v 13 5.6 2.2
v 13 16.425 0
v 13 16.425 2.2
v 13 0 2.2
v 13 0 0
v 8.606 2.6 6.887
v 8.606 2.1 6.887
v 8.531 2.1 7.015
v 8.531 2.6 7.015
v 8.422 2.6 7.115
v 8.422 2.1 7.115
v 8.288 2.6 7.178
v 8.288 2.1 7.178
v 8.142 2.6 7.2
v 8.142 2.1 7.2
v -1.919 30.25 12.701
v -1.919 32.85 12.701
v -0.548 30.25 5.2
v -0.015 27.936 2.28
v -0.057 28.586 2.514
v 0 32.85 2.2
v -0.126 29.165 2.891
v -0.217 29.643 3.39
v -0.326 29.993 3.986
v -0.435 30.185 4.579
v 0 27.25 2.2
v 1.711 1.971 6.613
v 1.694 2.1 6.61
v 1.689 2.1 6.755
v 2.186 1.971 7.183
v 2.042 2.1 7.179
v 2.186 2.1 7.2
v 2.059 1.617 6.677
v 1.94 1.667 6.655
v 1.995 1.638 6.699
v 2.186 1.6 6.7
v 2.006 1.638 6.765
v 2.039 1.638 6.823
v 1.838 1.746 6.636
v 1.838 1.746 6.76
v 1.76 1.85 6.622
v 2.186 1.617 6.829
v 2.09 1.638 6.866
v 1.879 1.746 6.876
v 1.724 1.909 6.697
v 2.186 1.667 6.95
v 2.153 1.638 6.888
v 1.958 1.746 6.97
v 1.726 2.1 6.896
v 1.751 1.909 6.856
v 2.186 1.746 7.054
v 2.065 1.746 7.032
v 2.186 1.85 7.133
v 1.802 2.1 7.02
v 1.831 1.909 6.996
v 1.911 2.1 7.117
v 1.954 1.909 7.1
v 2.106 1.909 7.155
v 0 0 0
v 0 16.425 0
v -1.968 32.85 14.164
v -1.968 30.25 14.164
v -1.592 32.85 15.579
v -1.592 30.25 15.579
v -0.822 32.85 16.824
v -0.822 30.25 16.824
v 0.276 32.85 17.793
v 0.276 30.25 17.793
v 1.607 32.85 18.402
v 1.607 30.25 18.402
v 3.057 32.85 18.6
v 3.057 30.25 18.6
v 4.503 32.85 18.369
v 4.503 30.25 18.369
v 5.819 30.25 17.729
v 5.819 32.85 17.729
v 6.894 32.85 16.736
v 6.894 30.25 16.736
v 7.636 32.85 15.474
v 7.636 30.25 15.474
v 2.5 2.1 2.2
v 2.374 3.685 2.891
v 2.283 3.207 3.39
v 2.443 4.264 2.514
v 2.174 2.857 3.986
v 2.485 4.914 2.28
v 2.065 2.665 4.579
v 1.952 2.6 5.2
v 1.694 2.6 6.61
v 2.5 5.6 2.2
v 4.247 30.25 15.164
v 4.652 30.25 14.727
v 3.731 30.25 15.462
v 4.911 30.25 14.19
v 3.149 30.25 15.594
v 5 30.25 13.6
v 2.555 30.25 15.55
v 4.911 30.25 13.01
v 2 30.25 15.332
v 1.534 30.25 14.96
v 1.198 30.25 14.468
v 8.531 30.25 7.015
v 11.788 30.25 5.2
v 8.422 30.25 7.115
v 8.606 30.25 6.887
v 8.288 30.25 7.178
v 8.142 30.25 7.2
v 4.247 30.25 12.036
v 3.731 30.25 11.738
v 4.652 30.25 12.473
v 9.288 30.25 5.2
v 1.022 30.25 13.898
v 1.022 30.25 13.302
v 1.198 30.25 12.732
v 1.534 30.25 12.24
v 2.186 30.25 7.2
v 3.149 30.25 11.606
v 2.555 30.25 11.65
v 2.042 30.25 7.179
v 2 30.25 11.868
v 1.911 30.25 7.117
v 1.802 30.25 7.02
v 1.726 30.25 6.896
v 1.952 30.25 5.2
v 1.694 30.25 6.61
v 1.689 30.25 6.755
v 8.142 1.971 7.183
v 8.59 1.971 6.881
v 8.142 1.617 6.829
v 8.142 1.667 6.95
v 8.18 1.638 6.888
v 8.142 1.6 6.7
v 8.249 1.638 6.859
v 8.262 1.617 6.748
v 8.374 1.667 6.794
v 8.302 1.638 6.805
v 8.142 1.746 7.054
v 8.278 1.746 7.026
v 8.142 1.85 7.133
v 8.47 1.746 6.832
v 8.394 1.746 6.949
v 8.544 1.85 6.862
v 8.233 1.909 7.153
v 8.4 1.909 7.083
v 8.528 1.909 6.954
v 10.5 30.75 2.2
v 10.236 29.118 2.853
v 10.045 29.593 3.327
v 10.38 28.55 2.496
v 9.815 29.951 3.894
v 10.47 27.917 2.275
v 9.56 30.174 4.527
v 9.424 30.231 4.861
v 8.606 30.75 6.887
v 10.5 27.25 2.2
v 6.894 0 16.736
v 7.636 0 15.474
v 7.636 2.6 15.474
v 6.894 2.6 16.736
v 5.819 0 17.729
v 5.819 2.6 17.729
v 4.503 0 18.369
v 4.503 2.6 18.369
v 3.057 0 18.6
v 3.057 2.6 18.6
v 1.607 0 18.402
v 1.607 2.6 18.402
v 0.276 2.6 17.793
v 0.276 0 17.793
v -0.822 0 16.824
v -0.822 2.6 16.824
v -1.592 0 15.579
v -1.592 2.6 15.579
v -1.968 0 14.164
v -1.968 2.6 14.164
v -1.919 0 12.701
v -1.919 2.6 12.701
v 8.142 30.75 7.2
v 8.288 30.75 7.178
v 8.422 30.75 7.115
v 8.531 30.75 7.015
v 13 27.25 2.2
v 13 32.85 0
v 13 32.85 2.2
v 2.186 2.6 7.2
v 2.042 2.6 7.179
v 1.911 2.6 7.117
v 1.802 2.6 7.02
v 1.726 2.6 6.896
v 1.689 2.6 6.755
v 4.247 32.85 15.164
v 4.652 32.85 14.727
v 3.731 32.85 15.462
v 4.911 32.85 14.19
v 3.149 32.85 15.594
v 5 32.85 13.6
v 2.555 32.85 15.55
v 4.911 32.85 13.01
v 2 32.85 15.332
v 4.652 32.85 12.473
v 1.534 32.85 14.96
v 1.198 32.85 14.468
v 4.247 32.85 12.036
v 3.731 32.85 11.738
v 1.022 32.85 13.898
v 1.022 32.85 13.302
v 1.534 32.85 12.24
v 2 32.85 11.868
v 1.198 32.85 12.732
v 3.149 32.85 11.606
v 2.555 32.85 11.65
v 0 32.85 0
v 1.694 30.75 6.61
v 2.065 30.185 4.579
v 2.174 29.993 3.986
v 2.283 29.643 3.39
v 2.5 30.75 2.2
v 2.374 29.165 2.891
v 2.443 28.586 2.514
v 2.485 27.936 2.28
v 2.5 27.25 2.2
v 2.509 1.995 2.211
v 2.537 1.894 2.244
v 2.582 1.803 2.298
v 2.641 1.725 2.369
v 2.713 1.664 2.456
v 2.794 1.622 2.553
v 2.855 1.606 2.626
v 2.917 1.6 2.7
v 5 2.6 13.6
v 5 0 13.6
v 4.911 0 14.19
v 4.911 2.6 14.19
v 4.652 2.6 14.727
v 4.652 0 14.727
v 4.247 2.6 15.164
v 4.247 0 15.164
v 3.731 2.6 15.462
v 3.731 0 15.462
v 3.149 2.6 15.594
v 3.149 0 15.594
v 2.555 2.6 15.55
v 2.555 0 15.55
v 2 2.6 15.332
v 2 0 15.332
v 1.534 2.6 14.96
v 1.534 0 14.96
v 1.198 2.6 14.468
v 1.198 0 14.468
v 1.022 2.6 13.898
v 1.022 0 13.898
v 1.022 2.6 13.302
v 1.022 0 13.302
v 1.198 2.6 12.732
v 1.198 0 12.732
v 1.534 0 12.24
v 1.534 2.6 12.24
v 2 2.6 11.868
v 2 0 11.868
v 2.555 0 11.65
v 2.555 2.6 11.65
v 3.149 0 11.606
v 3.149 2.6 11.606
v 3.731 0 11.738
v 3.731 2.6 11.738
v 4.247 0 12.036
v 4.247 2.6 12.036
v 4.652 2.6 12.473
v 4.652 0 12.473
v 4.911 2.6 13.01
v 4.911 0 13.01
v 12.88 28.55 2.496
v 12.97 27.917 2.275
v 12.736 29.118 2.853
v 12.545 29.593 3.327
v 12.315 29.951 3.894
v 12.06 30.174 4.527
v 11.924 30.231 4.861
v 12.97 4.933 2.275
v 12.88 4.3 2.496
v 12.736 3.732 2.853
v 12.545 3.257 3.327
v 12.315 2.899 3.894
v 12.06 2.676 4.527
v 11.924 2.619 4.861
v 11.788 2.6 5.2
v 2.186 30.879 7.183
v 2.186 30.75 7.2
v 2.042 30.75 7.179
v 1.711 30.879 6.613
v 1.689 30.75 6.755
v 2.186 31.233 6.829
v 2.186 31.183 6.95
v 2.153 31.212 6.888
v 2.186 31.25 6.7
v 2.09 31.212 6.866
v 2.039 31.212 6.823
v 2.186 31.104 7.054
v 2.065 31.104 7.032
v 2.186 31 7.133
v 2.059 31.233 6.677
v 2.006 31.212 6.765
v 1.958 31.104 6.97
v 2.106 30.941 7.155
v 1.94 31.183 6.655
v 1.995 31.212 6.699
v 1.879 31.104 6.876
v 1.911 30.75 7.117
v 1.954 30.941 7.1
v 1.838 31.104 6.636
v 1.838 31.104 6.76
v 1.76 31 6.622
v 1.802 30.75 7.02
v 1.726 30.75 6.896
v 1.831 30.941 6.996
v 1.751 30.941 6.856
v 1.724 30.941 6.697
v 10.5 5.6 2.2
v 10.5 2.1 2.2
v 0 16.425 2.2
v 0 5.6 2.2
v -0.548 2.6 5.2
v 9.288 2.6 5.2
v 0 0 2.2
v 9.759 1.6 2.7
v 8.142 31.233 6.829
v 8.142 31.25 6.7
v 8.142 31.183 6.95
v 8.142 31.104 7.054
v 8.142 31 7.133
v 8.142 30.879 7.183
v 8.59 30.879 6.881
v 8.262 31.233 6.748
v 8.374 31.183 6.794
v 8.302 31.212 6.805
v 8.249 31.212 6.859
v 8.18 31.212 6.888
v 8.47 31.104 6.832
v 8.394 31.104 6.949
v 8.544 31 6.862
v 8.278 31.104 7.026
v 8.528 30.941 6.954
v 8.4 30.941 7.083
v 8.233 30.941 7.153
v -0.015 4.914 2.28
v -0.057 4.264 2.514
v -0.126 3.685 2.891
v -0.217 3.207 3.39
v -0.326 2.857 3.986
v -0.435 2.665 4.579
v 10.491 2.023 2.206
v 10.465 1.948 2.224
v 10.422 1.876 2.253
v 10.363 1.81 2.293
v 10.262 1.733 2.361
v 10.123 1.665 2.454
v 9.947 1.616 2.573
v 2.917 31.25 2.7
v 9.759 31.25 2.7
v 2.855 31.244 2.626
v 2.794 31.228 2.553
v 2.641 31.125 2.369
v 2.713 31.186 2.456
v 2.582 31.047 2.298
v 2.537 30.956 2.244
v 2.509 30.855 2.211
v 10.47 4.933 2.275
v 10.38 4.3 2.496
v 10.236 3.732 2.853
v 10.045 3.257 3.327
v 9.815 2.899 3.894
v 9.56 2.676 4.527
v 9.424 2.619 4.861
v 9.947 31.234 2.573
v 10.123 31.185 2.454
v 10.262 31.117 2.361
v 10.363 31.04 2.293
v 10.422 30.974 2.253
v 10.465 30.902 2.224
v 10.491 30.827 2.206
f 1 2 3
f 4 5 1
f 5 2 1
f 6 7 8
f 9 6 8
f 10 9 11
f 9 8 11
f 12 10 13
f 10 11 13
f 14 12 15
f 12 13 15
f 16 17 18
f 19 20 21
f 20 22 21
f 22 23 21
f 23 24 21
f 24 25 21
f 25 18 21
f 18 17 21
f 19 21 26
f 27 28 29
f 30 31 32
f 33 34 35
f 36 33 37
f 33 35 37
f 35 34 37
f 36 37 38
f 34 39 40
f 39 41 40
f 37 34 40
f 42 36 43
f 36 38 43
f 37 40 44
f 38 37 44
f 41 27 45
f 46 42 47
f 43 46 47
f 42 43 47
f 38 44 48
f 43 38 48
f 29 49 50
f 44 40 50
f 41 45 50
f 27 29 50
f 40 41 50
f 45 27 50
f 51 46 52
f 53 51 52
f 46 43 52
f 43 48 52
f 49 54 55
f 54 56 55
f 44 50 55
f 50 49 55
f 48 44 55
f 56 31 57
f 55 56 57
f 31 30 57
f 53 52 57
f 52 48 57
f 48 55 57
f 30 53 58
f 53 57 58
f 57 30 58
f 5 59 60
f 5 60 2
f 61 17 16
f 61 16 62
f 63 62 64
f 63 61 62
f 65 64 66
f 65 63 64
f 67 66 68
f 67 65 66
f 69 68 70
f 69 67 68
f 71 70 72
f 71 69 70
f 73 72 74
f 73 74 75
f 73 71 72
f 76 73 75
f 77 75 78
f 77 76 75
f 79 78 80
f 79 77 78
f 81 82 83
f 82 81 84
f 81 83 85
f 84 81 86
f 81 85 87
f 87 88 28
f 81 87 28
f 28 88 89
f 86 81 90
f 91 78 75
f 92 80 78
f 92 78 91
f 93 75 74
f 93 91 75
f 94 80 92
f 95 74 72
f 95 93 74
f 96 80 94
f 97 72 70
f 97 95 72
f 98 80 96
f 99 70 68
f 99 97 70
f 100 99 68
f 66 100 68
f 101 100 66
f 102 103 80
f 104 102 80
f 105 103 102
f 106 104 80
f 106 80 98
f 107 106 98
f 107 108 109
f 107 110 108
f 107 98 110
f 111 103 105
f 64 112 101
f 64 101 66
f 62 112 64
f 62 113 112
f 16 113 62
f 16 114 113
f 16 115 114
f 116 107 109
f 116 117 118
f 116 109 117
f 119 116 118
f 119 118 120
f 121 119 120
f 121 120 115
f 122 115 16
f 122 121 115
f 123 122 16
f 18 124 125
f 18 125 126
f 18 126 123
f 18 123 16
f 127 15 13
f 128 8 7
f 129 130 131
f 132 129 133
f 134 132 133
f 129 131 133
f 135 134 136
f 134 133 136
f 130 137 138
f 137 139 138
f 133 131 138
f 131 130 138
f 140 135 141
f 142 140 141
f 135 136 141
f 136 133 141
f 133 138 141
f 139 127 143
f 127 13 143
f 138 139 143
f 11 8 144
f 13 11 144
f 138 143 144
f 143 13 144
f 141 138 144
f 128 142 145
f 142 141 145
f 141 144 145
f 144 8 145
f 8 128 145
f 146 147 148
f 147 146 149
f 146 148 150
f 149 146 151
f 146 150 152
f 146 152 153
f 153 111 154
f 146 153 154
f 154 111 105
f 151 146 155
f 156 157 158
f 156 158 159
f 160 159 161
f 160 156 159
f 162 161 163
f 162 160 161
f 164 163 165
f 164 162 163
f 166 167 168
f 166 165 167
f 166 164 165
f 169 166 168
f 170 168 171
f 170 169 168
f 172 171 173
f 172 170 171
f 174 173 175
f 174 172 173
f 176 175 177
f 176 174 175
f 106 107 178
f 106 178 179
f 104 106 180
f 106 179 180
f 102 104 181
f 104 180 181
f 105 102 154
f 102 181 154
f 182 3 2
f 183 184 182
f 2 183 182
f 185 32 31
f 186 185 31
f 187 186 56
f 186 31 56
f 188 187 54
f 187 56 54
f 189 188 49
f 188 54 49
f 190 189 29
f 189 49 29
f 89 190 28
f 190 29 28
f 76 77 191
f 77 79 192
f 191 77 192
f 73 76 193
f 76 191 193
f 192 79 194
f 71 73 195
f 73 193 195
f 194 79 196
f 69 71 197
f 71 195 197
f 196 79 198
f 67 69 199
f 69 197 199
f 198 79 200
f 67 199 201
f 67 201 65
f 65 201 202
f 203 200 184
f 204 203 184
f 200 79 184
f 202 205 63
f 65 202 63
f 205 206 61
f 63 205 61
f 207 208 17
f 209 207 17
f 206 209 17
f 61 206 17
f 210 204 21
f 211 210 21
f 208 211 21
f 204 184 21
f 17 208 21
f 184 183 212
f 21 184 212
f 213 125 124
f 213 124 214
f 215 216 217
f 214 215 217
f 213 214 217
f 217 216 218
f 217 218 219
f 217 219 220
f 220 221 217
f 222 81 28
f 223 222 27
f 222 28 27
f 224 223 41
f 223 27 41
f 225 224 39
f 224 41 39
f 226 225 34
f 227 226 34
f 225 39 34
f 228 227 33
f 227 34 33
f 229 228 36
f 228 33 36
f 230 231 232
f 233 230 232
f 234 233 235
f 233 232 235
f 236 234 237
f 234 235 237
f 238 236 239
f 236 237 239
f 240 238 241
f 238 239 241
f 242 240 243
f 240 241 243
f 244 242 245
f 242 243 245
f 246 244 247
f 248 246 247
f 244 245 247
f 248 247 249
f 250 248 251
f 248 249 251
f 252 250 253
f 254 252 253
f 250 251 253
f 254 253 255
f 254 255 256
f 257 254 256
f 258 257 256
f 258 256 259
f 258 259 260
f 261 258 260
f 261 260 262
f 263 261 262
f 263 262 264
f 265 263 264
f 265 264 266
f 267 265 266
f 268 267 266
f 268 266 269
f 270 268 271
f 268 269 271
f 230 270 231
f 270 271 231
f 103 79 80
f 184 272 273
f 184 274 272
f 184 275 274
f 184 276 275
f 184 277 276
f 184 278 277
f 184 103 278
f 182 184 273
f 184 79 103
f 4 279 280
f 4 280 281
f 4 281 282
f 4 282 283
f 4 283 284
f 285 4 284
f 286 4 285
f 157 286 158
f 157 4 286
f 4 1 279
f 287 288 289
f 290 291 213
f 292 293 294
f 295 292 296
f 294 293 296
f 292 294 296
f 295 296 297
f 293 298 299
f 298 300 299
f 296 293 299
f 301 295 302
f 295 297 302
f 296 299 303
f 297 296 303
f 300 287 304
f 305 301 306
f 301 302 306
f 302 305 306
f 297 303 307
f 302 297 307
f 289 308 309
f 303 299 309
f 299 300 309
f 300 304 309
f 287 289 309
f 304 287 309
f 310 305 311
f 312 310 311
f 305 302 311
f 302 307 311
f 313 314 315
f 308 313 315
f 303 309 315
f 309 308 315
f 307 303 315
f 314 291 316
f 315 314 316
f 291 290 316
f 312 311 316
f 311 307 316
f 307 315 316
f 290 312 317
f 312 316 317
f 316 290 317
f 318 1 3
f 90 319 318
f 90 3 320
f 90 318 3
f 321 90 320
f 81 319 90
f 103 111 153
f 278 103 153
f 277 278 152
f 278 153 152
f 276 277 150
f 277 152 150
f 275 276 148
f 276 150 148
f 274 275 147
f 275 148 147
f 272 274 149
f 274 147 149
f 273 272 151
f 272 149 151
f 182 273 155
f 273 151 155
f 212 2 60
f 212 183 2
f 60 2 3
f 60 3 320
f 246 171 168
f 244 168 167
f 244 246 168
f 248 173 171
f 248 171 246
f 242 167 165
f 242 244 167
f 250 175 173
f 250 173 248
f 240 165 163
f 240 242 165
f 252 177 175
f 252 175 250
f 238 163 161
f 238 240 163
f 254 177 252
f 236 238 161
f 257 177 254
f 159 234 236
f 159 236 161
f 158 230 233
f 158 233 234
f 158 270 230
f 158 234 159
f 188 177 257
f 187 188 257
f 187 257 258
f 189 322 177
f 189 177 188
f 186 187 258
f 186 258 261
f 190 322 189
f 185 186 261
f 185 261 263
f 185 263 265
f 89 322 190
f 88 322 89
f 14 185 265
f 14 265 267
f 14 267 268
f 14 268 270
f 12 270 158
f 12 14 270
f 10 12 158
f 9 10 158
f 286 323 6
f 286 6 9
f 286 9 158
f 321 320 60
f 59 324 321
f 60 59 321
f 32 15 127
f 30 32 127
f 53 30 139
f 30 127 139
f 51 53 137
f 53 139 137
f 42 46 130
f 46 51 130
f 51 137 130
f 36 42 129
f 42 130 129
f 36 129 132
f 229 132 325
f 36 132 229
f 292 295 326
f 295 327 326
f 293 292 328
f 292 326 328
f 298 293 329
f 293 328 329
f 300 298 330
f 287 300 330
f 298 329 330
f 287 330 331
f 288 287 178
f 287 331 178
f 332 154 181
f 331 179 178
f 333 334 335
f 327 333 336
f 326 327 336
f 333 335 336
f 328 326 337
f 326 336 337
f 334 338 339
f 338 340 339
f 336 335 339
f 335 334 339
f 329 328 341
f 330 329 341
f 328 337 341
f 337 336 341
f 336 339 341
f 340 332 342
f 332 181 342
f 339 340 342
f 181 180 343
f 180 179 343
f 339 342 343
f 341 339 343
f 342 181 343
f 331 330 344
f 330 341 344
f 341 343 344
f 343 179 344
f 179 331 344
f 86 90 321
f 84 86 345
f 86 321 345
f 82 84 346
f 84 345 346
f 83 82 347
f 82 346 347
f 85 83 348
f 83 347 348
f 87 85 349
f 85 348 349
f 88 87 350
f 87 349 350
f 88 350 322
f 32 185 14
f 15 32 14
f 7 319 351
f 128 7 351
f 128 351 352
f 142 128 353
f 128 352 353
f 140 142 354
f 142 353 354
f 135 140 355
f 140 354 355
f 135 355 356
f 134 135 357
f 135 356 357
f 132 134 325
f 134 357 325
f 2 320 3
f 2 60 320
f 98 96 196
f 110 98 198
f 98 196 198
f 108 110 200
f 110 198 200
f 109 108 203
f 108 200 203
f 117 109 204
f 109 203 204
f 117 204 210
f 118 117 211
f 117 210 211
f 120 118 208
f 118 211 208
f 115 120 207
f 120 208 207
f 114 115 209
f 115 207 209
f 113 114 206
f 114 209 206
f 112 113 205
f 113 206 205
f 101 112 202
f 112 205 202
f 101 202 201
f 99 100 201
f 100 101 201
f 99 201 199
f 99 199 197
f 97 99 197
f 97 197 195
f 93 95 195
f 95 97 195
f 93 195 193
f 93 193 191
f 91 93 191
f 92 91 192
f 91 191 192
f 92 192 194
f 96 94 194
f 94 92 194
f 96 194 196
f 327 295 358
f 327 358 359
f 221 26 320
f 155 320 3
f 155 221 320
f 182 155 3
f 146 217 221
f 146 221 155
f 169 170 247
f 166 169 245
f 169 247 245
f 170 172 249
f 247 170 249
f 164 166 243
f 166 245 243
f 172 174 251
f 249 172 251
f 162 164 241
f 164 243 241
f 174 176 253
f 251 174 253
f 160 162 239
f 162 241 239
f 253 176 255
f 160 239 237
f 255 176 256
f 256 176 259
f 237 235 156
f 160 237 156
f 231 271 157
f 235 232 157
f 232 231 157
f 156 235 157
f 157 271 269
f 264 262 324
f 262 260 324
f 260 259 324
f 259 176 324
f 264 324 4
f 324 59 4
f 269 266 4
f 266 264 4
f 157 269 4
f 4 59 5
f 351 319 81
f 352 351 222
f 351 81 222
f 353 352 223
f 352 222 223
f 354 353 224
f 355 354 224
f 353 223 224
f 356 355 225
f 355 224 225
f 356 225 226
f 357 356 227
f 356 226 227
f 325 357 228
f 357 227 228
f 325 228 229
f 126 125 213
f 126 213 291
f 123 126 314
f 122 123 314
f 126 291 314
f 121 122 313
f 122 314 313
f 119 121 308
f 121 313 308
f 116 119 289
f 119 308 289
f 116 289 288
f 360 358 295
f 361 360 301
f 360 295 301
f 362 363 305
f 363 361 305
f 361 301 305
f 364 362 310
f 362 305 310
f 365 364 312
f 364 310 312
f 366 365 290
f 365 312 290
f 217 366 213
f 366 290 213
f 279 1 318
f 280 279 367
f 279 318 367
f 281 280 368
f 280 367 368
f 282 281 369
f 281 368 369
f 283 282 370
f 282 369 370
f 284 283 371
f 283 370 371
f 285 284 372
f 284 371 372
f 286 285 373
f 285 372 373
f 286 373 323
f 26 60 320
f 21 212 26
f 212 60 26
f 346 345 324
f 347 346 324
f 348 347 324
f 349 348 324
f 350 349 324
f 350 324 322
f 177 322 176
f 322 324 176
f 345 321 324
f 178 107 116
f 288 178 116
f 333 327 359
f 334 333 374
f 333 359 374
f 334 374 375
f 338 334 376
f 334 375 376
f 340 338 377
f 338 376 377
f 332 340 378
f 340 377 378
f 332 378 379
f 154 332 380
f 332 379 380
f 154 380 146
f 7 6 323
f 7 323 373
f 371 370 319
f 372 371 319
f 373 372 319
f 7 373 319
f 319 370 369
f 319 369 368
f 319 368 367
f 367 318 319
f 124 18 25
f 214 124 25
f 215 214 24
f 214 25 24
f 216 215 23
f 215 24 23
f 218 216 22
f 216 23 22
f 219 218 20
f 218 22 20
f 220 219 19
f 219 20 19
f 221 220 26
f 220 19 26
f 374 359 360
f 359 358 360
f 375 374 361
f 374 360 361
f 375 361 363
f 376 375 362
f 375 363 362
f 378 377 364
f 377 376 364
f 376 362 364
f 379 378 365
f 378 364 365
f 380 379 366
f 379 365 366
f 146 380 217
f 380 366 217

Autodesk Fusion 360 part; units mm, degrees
sketch "スケッチ1" plane through (0, 0, 0) normal (0, 1, 0) x (1, 0, 0)
  line L0 (0, 0) -> (13, 0)
  line L1 (13, 0) -> (13, -2.2)
  line L2 (13, -2.2) -> (0, -2.2)
  line L3 (0, -2.2) -> (0, 0)
  line L4 (0, -2.2) -> (3, -2.2)
  line L5 (3, -2.2) -> (3, -13.6)
  line L6 (3, -2.2) -> (14.4, -2.2) construction
  circle A0 centre (3, -13.6) radius 5
  circle A1 centre (3, -13.6) radius 2
  line L7 (0, -2.2) -> (-1.9186, -12.7014)
  line L8 (13, -2.2) -> (7.6357, -15.4735)
  dimension "d1" = 2.2
  dimension "d2" = 13
  dimension "d3" = 3
  dimension "d4" = 90
  dimension "d5" = 11.4
  dimension "d6" = 10
  dimension "d7" = 4
extrude "押し出し1" add sketch "スケッチ1" along normal blind 2.6 contours L2 L4 L5 A0 L7 | L2 L5 A0 L8 | A0 makes body 1
extrude "押し出し2" add sketch "スケッチ1" along normal blind 16.425 contours L0 L1 L2 L3 L4 bodies 1
fillet "フィレット1" radius 3 1 edges at (6.5, 2.6, 2.2) on bodies 1
ref_plane "作業平面1" through (6.5, 16.425, 1.1) normal (0, 1, 0) x (0, 0, 1)
delete_face "面を削除1" 1 faces at (7.8804, 2.6711, 4.5507) on bodies 1
sketch "スケッチ2" plane through (0, 2.6, 0) normal (0, 1, 0) x (-1, 0, 0)
  line L0 (-13, 2.2) -> (0, 2.2)
  line L1 (0, 2.2) -> (1.9186, 12.7014)
  arc A0 (1.9186, 12.7014) -> (-7.6357, 15.4735) centre (-3, 13.6) ccw
  line L2 (-7.6357, 15.4735) -> (-13, 2.2)
  circle A1 centre (-3, 13.6) radius 2
  line L3 (-10.5, 2.2) -> (-2.5, 2.2)
  line L4 (-2.5, 2.2) -> (-1.5865, 7.2)
  line L5 (-1.5865, 7.2) -> (-8.4793, 7.2)
  line L6 (-8.4793, 7.2) -> (-10.5, 2.2)
  dimension "d15" = 2.5
  dimension "d16" = 8
  dimension "d17" = 5
extrude "押し出し3" cut sketch "スケッチ2" against normal blind 1 contours L0 L3 L4 L5 L6 bodies 1
fillet "フィレット2" radius 3 2 edges at (1.25, 2.6, 2.2) (11.75, 2.6, 2.2) on bodies 1
fillet "フィレット3" radius 0.5 6 edges at (6.5, 1.6, 2.2) (2.0433, 1.6, 4.7) (5.0329, 1.6, 7.2) (1.5865, 2.1, 7.2) (8.4793, 2.1, 7.2) (9.4897, 1.6, 4.7) on bodies 1
mirror "ミラー2" about plane through (6.5, 16.425, 1.1) normal (0, 1, 0) of bodies 1 makes body 2
